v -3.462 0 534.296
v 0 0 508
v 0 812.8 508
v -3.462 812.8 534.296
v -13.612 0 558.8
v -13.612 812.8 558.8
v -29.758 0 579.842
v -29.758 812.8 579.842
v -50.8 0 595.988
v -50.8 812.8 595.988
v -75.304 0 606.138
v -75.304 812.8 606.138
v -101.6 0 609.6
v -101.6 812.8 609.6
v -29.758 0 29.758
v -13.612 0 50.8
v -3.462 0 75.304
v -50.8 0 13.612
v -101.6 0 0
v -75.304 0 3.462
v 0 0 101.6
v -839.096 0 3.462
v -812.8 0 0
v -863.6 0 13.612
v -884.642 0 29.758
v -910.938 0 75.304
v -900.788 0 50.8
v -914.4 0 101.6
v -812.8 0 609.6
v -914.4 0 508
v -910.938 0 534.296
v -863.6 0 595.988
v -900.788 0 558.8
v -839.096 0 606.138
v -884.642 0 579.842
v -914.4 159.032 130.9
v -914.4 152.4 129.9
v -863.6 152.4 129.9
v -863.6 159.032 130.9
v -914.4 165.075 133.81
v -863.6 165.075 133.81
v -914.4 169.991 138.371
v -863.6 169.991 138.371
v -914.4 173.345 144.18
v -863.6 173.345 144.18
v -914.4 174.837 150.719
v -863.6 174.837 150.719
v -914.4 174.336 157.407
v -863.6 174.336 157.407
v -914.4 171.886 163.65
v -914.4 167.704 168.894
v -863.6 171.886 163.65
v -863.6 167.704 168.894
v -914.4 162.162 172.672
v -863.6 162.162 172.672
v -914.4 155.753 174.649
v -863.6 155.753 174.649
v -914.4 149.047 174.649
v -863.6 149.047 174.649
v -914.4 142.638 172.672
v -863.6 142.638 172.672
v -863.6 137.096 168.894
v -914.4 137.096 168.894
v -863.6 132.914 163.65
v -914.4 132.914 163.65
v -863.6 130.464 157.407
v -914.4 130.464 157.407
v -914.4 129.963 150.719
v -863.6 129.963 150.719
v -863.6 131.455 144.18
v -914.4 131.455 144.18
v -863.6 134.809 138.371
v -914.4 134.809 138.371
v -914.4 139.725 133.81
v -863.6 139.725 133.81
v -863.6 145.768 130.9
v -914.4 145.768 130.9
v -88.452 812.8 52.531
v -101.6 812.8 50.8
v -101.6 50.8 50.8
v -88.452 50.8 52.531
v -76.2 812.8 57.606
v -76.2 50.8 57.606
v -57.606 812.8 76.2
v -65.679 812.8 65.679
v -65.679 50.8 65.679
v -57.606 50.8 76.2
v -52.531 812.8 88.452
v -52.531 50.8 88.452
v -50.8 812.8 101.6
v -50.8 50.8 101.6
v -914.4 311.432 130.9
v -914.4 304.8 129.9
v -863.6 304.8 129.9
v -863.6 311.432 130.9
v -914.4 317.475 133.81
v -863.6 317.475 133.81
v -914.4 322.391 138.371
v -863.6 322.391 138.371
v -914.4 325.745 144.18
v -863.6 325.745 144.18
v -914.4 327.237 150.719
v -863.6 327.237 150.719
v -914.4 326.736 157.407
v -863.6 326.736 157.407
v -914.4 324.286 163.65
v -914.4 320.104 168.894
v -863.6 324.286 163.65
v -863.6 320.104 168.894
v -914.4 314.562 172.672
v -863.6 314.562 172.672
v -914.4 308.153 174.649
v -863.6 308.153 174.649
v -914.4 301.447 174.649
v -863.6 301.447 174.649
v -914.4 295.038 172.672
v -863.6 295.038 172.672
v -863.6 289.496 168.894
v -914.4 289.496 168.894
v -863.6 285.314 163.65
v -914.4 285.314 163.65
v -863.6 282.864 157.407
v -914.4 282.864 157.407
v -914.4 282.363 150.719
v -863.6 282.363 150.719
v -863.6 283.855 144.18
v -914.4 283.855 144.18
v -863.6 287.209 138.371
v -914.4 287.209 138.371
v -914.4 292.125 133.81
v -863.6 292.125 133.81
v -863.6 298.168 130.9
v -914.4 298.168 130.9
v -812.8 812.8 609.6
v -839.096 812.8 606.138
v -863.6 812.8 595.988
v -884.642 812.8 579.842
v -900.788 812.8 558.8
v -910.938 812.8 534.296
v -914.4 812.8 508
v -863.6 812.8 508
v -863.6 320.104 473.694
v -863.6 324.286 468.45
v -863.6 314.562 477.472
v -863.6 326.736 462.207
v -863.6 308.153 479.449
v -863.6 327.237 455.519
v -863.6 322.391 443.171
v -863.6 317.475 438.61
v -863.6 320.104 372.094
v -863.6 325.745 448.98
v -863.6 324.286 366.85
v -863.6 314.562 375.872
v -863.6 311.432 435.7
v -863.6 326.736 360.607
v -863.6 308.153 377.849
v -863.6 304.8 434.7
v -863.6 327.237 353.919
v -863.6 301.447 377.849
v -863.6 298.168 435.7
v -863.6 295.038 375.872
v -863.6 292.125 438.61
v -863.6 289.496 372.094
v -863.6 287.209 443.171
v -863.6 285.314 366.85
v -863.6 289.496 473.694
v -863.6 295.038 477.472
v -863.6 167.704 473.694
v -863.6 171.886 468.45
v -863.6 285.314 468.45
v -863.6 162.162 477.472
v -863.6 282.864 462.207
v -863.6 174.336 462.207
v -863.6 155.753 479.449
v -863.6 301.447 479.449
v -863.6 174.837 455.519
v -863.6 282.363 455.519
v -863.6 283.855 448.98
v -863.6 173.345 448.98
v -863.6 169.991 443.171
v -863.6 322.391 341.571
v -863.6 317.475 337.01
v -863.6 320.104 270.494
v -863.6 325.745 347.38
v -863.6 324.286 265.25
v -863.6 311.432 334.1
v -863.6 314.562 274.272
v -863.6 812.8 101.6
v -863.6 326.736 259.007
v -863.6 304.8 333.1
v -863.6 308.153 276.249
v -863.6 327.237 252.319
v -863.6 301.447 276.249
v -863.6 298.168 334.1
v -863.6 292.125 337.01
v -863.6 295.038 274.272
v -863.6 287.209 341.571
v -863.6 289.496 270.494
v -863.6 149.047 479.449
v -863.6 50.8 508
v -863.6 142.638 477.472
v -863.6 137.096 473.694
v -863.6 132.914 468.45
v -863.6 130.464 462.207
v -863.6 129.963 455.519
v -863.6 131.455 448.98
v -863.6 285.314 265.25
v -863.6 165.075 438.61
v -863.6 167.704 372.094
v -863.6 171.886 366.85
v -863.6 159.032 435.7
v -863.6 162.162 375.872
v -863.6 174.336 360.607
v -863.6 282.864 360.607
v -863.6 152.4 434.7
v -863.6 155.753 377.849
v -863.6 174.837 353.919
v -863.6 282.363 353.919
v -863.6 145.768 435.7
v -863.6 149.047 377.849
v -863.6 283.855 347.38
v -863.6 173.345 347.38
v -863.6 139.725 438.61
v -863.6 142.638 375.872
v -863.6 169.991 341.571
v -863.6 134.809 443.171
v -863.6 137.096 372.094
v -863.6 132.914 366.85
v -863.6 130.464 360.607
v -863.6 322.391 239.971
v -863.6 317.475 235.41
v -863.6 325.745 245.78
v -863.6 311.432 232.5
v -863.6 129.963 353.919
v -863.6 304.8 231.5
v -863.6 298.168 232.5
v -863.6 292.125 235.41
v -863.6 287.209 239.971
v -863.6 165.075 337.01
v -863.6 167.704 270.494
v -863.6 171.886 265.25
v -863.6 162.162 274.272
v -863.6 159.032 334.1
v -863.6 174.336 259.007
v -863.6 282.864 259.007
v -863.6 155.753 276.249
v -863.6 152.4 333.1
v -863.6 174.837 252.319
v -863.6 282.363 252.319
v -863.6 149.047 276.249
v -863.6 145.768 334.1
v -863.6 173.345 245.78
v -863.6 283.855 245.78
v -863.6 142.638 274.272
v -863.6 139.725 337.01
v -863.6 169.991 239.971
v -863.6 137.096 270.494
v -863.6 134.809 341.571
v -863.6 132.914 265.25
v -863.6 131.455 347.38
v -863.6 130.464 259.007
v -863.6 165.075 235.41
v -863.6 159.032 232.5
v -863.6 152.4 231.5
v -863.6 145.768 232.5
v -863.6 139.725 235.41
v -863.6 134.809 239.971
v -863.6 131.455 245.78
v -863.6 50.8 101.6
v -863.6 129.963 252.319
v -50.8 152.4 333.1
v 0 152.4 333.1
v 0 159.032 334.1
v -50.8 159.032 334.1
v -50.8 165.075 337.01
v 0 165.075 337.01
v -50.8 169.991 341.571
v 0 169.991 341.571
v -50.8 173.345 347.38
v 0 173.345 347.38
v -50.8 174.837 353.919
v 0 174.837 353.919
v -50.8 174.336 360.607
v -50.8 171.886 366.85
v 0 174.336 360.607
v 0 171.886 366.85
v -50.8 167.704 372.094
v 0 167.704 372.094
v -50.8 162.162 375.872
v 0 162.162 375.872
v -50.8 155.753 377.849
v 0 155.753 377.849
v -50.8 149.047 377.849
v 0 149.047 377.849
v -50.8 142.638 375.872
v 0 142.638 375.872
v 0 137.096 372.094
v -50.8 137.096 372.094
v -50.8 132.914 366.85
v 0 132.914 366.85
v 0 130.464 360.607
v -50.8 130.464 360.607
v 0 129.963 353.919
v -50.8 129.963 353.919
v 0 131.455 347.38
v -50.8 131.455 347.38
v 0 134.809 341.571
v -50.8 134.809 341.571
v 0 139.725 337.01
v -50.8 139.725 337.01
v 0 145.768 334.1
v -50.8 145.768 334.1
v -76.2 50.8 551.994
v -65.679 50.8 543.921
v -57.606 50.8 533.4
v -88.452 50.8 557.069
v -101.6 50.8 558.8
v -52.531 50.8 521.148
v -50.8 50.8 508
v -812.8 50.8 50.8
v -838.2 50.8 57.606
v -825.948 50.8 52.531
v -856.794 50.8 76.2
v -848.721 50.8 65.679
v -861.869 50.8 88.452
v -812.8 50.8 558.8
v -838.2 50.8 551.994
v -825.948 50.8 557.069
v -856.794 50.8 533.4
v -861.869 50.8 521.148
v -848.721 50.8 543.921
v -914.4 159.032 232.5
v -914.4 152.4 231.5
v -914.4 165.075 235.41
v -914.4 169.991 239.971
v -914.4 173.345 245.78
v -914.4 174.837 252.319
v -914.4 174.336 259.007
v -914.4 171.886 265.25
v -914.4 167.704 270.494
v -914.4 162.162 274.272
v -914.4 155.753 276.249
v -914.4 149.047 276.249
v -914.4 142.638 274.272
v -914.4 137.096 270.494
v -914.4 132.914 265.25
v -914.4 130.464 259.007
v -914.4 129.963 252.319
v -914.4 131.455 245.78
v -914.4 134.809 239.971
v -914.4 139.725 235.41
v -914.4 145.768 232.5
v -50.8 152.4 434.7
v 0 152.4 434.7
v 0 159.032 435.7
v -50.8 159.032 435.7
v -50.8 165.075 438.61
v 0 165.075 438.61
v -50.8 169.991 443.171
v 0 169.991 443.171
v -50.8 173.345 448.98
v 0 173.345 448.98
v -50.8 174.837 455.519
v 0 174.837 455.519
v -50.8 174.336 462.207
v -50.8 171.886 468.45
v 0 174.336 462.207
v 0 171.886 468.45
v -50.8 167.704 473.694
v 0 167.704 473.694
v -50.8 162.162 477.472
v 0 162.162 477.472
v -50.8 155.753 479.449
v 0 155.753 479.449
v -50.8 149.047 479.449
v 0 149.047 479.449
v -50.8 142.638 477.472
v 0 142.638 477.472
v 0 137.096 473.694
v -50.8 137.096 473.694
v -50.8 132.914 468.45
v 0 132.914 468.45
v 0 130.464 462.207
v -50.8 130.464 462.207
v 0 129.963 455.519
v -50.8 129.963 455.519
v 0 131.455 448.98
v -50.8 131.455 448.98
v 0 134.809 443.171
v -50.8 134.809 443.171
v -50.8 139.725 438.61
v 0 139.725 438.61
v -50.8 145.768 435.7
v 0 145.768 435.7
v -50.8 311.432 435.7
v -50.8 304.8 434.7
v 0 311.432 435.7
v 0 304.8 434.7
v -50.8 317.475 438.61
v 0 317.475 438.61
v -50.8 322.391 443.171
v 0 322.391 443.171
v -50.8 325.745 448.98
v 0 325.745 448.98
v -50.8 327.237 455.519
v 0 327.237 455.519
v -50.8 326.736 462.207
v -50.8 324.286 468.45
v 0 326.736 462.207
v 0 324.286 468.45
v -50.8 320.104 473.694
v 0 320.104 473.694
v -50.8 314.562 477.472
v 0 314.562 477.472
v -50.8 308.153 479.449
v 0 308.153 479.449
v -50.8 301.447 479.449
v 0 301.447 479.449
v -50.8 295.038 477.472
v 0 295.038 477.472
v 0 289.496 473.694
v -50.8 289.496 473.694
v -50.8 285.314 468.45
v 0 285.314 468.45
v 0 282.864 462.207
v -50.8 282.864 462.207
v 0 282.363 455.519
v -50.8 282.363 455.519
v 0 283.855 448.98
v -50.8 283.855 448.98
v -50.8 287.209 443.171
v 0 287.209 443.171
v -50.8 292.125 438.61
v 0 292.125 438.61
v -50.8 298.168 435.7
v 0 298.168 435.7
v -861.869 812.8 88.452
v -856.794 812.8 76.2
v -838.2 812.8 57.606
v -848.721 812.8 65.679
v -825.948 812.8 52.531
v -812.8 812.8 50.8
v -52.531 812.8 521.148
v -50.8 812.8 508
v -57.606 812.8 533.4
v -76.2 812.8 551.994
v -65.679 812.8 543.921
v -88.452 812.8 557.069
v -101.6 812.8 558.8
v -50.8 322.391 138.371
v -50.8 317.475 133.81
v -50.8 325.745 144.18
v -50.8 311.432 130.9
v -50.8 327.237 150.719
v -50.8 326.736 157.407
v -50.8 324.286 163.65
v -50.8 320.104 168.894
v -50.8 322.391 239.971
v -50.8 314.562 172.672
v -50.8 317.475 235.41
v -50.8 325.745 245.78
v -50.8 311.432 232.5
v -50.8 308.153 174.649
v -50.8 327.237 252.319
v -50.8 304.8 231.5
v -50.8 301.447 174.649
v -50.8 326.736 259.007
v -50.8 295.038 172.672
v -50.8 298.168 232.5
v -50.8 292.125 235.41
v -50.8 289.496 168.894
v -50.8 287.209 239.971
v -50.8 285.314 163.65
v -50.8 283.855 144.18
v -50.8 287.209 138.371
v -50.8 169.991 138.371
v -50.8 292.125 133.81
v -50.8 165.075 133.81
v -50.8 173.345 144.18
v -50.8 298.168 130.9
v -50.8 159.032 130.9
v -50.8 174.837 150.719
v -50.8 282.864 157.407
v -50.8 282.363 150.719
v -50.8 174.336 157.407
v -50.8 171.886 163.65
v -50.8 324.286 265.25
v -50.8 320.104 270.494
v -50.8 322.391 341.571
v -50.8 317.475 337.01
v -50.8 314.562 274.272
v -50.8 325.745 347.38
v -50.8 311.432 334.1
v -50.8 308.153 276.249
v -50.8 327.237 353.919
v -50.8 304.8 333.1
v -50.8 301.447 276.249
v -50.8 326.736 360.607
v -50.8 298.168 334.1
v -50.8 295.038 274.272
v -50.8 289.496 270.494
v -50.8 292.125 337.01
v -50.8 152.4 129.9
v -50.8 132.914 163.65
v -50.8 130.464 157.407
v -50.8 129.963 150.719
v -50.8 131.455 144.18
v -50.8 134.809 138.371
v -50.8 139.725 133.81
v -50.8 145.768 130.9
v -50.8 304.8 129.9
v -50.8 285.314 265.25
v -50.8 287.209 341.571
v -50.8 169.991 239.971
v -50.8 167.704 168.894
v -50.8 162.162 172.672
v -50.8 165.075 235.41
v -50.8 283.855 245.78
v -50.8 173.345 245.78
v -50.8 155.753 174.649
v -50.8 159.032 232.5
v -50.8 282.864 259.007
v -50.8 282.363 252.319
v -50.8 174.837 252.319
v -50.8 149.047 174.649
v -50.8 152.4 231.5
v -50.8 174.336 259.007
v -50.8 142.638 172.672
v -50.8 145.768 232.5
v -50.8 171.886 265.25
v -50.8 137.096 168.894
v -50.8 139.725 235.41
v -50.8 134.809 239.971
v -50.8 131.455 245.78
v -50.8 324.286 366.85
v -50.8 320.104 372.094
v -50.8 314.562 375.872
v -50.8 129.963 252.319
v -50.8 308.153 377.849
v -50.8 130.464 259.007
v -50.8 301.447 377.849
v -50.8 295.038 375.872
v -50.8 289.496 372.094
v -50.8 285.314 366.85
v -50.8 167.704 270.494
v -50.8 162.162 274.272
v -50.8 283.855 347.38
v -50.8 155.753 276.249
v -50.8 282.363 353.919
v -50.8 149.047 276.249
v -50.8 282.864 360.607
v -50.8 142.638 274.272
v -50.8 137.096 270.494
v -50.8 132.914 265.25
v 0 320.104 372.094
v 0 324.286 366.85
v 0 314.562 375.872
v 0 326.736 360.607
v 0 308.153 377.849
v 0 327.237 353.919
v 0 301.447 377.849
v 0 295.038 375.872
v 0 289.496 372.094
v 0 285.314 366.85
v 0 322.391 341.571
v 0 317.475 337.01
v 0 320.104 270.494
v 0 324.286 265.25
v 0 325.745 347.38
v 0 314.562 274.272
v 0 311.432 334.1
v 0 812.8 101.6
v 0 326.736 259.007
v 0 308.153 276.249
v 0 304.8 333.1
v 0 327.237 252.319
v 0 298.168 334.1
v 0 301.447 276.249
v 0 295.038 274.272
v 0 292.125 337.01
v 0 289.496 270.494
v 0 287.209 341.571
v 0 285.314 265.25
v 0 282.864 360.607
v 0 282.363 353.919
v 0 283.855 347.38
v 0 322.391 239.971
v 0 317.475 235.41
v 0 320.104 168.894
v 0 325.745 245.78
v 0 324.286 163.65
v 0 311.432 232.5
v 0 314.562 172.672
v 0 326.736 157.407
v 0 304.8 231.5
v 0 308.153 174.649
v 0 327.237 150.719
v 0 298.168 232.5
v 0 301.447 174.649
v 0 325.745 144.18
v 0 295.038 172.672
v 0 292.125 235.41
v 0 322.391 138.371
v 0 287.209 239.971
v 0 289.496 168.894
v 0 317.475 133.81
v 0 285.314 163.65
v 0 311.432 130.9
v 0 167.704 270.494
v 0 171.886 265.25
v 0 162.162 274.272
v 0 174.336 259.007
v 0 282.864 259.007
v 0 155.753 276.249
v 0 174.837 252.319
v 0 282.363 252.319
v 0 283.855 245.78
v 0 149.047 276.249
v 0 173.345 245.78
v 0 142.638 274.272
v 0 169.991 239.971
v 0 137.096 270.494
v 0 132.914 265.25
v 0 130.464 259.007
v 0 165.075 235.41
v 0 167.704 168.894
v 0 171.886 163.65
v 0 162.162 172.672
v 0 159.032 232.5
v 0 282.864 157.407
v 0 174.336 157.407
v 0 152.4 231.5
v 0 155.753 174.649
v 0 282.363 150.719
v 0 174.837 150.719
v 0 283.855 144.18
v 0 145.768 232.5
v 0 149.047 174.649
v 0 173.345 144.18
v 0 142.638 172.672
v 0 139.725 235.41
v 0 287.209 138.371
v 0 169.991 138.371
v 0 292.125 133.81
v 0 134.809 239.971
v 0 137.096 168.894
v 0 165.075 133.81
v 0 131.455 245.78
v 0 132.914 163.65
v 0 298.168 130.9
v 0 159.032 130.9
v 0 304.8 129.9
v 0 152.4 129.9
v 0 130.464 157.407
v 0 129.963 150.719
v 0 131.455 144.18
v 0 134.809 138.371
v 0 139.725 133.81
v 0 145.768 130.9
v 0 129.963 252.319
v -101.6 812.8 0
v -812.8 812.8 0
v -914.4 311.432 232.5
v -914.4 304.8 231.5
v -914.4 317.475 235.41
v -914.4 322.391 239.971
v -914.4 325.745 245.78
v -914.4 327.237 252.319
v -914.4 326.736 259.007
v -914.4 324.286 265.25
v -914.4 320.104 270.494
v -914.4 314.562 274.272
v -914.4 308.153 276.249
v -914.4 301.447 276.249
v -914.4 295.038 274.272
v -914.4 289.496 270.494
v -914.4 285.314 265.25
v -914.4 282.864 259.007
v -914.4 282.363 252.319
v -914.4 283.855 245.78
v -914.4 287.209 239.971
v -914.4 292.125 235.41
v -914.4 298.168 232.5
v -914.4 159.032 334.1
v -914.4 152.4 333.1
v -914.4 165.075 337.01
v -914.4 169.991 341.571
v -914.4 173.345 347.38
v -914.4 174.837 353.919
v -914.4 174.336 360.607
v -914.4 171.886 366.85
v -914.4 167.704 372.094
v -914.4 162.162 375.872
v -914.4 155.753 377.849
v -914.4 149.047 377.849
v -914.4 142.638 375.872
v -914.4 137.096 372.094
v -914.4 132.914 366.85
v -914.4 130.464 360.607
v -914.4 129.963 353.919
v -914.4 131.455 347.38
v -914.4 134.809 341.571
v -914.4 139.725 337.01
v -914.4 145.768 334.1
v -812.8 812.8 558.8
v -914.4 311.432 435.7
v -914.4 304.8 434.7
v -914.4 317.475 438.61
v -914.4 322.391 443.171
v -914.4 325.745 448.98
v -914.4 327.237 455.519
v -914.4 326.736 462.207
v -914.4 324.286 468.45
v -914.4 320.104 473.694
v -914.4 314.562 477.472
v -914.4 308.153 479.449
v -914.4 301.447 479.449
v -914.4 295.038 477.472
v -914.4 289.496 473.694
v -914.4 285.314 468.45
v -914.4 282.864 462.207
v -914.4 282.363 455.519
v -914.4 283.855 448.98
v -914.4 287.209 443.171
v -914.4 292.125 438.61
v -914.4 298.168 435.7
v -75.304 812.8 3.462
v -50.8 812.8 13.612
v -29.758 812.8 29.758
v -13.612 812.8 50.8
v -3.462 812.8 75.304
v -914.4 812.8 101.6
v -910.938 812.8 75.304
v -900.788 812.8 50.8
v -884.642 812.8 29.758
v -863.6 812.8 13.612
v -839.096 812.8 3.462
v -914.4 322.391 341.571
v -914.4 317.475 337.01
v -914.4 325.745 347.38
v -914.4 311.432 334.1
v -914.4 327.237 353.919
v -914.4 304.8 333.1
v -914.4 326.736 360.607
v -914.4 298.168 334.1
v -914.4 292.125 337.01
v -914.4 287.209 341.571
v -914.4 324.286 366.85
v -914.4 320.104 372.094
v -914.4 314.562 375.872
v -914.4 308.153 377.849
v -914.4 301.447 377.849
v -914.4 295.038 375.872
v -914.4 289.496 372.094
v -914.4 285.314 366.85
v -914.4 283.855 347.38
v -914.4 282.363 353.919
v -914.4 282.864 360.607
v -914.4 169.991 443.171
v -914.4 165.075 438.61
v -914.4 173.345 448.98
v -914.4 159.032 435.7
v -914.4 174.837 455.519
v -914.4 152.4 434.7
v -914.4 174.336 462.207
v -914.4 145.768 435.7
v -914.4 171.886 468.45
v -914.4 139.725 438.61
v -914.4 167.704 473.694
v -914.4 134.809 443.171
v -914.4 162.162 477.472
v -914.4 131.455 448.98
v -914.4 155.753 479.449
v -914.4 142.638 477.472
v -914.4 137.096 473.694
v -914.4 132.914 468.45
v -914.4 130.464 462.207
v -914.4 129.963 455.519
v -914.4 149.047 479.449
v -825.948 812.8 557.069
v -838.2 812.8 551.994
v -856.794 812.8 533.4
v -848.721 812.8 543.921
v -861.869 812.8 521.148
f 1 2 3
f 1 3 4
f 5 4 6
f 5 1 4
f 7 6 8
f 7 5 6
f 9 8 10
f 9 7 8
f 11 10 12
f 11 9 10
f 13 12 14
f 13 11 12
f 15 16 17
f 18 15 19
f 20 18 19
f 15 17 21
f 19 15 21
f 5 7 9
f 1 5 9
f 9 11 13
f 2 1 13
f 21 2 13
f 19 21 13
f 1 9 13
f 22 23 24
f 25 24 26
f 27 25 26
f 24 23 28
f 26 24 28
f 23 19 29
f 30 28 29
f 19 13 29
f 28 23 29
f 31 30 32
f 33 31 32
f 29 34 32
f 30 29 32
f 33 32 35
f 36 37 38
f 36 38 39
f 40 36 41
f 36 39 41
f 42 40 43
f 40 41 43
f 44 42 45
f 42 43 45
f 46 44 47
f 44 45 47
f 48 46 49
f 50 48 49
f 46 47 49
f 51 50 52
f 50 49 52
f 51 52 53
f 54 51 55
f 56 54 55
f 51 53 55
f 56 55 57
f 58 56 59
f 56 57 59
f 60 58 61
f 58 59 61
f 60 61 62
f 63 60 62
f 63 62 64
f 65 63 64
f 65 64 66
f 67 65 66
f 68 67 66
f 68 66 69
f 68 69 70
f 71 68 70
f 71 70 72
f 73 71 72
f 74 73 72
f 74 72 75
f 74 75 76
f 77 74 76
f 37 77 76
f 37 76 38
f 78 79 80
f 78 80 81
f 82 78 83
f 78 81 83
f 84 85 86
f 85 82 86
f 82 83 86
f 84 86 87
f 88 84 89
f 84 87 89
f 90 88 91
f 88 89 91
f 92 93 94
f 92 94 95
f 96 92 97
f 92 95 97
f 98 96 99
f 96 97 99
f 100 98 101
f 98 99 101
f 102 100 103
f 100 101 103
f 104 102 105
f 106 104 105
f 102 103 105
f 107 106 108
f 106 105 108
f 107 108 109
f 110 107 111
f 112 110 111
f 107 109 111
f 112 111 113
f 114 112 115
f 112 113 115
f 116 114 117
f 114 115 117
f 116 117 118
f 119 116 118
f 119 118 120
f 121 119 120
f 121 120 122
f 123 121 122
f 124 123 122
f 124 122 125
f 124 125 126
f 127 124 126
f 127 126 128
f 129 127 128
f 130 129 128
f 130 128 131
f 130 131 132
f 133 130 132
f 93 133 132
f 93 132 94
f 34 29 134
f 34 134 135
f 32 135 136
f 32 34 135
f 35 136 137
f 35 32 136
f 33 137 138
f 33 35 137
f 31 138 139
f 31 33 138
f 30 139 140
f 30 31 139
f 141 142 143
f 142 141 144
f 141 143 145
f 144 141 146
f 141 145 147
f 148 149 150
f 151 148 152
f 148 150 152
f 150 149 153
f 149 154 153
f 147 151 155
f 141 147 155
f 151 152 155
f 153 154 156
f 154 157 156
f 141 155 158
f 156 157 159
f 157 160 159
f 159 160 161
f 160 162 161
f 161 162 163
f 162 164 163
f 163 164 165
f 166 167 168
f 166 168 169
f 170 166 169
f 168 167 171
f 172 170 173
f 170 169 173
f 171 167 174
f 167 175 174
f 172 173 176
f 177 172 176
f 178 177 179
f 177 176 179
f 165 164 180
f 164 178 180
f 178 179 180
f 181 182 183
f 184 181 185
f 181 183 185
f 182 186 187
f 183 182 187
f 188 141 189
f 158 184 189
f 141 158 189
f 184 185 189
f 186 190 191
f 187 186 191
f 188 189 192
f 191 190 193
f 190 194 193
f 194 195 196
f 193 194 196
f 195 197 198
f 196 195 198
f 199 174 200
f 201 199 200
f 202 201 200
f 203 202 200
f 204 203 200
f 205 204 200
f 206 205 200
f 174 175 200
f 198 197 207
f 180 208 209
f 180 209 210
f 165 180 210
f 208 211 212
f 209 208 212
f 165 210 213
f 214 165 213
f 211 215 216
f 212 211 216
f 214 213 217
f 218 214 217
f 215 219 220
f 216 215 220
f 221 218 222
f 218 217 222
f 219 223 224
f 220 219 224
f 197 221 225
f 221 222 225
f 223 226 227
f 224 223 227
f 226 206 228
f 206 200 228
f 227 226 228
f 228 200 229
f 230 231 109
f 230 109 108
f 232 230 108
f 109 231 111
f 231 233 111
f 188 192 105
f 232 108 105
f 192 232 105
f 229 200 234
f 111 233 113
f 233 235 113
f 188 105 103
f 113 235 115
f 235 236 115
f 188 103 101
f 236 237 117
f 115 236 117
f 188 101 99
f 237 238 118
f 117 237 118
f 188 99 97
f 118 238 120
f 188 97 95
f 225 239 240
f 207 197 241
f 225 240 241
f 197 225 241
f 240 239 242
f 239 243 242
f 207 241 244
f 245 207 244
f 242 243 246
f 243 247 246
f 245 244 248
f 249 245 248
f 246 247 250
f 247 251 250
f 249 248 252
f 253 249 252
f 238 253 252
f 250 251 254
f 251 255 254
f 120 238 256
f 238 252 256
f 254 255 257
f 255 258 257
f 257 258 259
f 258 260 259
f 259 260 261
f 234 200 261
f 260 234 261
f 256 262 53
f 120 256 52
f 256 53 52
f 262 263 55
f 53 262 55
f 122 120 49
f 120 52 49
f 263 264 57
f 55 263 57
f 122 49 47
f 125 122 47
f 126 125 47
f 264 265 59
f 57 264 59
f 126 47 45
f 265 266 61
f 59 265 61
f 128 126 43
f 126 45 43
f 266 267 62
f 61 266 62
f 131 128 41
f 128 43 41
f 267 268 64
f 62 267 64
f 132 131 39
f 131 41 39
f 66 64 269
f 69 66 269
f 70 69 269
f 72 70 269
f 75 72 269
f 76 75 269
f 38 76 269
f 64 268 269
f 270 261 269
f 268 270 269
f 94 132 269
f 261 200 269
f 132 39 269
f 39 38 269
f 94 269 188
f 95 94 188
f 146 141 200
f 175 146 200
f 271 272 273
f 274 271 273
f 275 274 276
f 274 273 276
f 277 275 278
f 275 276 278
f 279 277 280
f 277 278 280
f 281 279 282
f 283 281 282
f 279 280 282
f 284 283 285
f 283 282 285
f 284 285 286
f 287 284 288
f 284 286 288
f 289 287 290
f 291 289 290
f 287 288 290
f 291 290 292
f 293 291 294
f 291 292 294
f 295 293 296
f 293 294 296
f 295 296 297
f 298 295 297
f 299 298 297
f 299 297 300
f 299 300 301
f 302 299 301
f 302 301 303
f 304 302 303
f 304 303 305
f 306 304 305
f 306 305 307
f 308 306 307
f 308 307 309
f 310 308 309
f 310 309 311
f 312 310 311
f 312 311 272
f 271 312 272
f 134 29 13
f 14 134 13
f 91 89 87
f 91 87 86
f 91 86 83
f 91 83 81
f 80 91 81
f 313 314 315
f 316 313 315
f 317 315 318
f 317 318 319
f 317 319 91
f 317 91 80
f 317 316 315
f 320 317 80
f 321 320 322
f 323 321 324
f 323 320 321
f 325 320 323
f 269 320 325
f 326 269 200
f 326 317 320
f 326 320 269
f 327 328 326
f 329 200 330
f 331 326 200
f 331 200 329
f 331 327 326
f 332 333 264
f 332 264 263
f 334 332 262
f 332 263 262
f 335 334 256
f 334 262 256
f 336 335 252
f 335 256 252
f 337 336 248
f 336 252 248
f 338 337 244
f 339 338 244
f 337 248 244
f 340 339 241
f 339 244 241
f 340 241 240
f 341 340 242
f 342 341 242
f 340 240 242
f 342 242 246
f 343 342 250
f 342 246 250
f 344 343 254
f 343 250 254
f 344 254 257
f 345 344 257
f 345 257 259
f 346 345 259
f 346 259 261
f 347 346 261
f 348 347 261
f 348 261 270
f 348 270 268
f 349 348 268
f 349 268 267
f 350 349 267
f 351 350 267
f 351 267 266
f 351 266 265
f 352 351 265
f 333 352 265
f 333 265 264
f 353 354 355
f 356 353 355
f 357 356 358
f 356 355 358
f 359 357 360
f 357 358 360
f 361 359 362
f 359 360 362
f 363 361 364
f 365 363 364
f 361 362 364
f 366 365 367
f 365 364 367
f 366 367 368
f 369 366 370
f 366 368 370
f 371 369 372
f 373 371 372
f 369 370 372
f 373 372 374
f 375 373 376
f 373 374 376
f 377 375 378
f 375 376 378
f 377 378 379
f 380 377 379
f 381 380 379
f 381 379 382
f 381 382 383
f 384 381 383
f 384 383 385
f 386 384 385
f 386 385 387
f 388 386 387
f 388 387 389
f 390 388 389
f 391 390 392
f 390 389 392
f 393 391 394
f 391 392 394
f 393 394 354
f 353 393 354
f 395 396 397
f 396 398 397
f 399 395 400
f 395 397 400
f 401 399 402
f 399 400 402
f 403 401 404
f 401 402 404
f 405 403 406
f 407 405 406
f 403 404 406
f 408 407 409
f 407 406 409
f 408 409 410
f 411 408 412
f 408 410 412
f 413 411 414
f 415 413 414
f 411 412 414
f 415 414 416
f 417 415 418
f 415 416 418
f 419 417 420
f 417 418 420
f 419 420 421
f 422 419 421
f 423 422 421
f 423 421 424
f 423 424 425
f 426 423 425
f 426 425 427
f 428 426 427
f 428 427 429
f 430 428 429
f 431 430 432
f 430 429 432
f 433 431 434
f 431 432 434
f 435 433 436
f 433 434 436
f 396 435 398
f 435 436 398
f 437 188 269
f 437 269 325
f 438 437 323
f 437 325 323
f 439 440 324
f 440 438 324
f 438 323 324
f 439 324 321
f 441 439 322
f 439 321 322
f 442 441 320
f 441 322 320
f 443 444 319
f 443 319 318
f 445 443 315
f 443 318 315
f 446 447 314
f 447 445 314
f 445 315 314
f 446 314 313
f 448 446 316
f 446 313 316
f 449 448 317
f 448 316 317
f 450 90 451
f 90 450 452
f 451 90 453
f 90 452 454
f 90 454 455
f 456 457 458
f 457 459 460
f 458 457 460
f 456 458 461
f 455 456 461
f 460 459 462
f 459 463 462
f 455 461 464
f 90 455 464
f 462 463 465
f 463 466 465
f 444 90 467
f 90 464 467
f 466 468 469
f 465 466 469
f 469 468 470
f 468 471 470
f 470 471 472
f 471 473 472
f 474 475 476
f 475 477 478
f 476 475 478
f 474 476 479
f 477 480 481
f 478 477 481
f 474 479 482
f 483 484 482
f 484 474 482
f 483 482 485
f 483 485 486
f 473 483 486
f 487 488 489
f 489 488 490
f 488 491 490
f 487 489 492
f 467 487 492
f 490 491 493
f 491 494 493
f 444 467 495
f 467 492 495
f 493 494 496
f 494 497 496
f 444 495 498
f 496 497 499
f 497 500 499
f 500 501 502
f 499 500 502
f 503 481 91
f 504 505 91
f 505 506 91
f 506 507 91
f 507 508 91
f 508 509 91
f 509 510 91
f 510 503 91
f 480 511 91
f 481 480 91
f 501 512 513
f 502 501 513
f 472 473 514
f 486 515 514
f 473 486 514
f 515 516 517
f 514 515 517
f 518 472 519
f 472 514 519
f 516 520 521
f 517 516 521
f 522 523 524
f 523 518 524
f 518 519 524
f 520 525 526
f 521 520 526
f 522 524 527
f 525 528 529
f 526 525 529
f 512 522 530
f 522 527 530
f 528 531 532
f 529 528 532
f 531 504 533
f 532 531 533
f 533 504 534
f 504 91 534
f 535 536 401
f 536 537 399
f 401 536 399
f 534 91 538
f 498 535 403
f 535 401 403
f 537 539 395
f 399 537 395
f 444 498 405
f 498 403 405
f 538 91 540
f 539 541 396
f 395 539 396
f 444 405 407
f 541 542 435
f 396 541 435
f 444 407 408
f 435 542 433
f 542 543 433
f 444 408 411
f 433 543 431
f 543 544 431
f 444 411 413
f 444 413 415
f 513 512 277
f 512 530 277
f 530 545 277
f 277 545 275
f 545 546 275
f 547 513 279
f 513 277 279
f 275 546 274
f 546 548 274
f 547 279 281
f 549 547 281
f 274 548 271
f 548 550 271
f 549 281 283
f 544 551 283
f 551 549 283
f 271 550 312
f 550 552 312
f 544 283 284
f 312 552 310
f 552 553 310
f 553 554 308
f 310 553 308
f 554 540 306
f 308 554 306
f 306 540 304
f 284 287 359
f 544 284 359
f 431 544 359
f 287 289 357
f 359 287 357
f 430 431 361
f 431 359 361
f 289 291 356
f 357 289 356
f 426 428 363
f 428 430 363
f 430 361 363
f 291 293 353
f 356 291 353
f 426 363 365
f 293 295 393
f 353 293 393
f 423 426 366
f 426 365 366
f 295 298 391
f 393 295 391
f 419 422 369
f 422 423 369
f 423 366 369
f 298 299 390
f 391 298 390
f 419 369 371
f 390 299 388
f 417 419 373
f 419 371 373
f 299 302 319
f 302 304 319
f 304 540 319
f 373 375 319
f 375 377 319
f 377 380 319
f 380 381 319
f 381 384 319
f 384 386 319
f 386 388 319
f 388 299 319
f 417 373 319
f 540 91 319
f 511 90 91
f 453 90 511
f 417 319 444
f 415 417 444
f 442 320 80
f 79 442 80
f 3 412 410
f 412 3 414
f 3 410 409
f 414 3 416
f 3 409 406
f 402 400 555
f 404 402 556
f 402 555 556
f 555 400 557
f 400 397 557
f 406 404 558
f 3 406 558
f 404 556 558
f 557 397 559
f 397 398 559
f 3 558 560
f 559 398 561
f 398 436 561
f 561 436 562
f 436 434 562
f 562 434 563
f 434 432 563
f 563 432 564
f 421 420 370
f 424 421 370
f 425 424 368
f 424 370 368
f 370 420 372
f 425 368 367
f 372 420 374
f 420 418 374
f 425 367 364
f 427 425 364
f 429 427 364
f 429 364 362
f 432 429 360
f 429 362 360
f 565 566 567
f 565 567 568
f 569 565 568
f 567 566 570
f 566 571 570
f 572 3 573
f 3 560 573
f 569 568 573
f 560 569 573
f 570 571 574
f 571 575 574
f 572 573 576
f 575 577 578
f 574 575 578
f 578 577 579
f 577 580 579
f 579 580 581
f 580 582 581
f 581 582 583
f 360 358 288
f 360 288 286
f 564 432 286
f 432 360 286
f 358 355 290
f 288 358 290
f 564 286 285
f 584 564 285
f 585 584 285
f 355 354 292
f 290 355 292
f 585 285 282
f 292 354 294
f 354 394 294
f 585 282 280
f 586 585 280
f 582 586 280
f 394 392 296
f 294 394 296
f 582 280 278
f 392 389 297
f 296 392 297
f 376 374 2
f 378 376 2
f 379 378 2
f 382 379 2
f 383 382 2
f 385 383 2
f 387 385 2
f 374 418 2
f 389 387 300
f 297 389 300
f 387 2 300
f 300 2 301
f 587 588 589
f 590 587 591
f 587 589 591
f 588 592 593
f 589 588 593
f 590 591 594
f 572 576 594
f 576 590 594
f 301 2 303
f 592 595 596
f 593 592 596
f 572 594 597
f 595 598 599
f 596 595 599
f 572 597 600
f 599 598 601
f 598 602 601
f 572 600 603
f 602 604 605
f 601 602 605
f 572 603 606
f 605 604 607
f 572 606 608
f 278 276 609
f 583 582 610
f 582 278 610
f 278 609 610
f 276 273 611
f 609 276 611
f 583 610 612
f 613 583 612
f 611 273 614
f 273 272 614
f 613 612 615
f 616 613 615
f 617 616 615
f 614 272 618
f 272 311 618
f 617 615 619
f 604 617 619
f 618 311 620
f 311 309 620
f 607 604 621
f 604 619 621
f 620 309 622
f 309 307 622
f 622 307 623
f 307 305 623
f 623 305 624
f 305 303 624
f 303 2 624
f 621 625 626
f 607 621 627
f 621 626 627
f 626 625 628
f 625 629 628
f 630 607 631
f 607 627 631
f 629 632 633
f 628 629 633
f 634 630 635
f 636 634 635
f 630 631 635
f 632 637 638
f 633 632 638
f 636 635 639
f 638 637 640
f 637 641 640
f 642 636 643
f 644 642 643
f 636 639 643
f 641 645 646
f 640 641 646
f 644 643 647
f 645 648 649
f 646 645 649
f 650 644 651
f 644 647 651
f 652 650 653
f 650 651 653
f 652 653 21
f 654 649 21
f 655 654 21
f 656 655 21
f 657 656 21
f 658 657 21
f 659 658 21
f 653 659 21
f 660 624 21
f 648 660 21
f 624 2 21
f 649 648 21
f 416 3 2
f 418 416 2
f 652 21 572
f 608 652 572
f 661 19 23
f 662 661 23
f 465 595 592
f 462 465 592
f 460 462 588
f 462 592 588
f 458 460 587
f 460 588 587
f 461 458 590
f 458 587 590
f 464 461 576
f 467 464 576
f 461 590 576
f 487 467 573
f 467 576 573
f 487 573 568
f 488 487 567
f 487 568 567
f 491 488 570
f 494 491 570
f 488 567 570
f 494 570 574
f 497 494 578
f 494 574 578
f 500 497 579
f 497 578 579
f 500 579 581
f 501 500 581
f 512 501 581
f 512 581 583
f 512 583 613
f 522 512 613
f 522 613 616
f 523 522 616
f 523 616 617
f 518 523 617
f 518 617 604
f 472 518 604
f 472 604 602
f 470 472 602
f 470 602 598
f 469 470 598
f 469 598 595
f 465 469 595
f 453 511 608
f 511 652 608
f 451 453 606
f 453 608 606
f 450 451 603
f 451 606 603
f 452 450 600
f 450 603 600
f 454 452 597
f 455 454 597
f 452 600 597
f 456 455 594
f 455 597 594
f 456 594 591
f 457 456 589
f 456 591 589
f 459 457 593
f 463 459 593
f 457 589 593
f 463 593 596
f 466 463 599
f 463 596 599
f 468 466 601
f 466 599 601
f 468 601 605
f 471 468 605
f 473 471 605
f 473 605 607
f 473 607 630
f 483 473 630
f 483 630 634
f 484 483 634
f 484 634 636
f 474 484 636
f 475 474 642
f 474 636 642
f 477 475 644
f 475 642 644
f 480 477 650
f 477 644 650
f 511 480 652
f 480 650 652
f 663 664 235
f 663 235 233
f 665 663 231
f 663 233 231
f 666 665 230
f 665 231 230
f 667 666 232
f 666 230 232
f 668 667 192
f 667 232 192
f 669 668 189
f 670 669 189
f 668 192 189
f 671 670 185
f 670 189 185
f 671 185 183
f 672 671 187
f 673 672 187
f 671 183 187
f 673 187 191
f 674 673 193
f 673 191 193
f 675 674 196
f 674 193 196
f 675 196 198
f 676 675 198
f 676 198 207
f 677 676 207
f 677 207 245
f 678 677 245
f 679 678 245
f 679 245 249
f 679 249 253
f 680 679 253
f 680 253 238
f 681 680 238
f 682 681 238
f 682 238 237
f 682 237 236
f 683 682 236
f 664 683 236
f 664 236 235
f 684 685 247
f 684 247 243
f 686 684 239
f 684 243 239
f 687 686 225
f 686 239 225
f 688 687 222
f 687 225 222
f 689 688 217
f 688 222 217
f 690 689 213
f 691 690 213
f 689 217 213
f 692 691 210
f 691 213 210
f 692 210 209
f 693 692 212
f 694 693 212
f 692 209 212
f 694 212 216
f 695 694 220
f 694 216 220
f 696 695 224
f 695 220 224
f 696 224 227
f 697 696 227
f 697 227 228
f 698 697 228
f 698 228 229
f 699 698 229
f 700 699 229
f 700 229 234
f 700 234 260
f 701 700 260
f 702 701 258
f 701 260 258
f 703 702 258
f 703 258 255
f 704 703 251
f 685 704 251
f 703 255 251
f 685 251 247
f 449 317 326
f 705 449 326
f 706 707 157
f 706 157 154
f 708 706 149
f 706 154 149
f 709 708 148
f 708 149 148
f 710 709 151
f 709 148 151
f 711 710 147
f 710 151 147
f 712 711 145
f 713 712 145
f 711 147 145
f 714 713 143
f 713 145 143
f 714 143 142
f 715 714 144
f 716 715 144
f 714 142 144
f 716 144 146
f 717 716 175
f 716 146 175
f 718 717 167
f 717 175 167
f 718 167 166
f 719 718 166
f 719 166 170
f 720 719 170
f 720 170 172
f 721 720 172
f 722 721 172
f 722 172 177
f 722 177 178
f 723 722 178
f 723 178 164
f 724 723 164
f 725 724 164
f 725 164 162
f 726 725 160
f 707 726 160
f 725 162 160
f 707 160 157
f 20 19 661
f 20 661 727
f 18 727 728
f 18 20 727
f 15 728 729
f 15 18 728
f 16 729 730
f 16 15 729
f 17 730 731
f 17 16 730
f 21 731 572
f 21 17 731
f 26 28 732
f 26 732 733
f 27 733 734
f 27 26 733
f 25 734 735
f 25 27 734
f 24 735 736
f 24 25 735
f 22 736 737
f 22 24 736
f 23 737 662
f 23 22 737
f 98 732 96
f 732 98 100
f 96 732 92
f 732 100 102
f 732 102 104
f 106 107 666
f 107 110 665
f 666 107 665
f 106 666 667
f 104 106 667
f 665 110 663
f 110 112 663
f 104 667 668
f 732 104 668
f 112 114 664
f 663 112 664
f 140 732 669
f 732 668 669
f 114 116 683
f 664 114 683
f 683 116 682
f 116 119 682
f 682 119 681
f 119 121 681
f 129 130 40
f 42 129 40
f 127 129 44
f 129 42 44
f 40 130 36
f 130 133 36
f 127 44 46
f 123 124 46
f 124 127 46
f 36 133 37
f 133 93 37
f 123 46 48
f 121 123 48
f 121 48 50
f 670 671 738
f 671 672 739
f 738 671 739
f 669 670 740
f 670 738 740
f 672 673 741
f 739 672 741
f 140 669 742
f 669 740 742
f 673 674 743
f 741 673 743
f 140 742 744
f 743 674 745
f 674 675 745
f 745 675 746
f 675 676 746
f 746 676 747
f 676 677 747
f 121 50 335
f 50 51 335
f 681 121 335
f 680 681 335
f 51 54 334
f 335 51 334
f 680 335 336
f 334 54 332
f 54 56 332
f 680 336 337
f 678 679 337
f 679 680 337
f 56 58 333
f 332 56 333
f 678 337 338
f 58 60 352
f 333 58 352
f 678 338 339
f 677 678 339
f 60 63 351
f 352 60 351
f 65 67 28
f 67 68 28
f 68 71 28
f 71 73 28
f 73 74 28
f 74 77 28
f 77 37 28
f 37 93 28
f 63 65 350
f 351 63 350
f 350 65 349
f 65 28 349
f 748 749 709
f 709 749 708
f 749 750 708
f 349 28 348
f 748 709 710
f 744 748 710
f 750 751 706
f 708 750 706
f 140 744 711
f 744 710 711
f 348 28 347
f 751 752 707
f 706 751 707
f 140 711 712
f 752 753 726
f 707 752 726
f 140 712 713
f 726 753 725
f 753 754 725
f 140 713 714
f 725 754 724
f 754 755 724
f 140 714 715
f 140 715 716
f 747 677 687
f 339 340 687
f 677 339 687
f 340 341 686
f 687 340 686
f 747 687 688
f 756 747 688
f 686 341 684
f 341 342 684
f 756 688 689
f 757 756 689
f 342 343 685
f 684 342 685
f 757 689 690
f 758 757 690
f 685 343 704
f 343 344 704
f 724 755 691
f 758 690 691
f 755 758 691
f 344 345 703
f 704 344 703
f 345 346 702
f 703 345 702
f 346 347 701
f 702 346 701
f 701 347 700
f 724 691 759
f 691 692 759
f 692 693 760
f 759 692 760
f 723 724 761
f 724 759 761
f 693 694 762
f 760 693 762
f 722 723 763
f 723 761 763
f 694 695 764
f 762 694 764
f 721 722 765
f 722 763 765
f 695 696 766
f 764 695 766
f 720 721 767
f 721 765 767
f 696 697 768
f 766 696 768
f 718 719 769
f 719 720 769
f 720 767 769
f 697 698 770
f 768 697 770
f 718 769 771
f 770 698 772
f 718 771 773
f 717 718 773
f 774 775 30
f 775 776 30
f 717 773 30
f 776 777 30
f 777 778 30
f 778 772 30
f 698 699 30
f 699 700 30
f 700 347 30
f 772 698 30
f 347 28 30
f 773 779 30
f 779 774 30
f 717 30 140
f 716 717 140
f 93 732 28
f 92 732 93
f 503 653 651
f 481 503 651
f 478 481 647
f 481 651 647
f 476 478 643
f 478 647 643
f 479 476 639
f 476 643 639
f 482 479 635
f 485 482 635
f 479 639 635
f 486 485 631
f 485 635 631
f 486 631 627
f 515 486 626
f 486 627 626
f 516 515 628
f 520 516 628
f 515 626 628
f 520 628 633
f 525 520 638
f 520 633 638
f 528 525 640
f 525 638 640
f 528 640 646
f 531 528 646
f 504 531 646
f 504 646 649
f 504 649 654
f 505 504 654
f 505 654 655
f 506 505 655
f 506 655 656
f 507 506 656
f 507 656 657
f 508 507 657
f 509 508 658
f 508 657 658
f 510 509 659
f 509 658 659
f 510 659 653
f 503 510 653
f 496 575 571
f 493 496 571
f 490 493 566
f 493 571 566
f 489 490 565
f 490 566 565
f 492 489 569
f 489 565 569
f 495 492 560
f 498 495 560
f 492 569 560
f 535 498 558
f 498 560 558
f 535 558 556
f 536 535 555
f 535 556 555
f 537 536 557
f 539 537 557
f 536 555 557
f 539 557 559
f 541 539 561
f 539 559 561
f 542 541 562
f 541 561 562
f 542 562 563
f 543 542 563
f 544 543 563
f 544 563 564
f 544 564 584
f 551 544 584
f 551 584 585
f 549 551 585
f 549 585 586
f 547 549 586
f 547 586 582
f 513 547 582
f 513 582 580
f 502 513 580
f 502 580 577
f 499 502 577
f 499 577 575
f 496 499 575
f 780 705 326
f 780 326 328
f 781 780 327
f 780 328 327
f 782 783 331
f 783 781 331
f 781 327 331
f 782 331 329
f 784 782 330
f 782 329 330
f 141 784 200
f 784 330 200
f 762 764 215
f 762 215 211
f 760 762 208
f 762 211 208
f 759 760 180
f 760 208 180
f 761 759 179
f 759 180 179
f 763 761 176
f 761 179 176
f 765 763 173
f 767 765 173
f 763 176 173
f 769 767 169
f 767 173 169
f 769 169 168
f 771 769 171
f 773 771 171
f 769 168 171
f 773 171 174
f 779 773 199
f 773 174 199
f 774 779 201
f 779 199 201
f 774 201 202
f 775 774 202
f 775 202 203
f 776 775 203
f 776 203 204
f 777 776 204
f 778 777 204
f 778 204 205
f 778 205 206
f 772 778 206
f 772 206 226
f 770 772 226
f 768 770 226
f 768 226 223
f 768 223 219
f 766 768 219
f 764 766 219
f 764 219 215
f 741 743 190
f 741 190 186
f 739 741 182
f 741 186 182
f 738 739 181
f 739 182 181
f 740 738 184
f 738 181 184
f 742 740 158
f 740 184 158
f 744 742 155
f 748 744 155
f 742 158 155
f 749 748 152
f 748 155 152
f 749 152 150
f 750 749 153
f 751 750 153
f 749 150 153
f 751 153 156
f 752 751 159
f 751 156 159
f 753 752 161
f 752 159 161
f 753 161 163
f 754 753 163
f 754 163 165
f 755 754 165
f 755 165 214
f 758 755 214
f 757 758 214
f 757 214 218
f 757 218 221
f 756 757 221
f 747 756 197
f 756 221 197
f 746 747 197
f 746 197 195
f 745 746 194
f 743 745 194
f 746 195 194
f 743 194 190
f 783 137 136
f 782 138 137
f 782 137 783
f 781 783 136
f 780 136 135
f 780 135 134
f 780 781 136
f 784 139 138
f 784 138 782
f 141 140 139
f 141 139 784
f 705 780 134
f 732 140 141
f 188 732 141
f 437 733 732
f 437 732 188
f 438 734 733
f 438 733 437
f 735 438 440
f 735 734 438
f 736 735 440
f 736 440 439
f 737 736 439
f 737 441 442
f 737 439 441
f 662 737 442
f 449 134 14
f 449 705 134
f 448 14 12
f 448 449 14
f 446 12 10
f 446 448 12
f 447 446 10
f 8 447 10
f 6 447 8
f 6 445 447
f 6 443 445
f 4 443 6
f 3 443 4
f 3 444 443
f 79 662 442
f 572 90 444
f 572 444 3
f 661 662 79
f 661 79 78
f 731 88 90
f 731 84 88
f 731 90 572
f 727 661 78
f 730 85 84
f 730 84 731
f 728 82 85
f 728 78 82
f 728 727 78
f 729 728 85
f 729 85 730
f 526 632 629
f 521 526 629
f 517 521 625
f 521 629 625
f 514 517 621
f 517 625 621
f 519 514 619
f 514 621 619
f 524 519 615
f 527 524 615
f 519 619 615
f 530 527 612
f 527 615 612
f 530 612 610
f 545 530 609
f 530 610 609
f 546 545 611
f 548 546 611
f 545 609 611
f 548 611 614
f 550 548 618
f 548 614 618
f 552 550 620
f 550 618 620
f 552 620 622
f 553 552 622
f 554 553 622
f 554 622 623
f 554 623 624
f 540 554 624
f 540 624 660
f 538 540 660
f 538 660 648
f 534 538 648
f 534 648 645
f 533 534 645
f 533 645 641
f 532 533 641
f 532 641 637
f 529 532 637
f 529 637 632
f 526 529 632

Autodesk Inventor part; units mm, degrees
ref_plane "YZ Plane" through (0, 0, 0) normal (1, 0, 0) x (0, 1, 0)
ref_plane "XZ Plane" through (0, 0, 0) normal (0, 1, 0) x (-1, 0, 0)
ref_plane "XY Plane" through (0, 0, 0) normal (0, 0, 1) x (1, 0, 0)
sketch "Sketch1" plane through (0, 0, 0) normal (0, 1, 0) x (-1, 0, 0)
  line L0 (101.6, 0) -> (812.8, 0)
  line L1 (914.4, 101.6) -> (914.4, 508)
  line L2 (812.8, 609.6) -> (101.6, 609.6)
  line L3 (0, 508) -> (0, 101.6)
  arc A0 (101.6, 609.6) -> (0, 508) centre (101.6, 508) ccw
  arc A1 (0, 101.6) -> (101.6, 0) centre (101.6, 101.6) ccw
  arc A2 (812.8, 0) -> (914.4, 101.6) centre (812.8, 101.6) ccw
  arc A3 (914.4, 508) -> (812.8, 609.6) centre (812.8, 508) ccw
  point P0 (0, 0)
  point P1 (914.4, 609.6)
  point P2 (914.4, 0)
  point P3 (0, 609.6)
  dimension "d0" = 914.4
  dimension "d1" = 609.6
  dimension "d9" = 101.6
extrude "Extrusion1" add sketch "Sketch1" along normal blind 50.8
sketch "Sketch3" plane through (0, 50.8, 0) normal (0, 1, 0) x (1, 0, 0)
  line L0 (0, -508) -> (0, -101.6) projected
  arc A0 (0, -101.6) -> (-101.6, 0) centre (-101.6, -101.6) ccw projected
  line L1 (-101.6, 0) -> (-812.8, 0) projected
  arc A1 (-812.8, 0) -> (-914.4, -101.6) centre (-812.8, -101.6) ccw projected
  line L2 (-914.4, -101.6) -> (-914.4, -508) projected
  arc A2 (-914.4, -508) -> (-812.8, -609.6) centre (-812.8, -508) ccw projected
  line L3 (-812.8, -609.6) -> (-101.6, -609.6) projected
  arc A3 (-101.6, -609.6) -> (0, -508) centre (-101.6, -508) ccw projected
  line L4 (-812.8, -50.8) -> (-101.6, -50.8)
  arc A4 (-50.8, -101.6) -> (-101.6, -50.8) centre (-101.6, -101.6) ccw
  line L5 (-50.8, -101.6) -> (-50.8, -508)
  arc A5 (-101.6, -558.8) -> (-50.8, -508) centre (-101.6, -508) ccw
  line L6 (-101.6, -558.8) -> (-812.8, -558.8)
  arc A6 (-863.6, -508) -> (-812.8, -558.8) centre (-812.8, -508) ccw
  line L7 (-863.6, -508) -> (-863.6, -101.6)
  arc A7 (-812.8, -50.8) -> (-863.6, -101.6) centre (-812.8, -101.6) ccw
  point P0 (0, 0)
  dimension "d10" = 50.8
extrude "Extrusion3" add sketch "Sketch3" along normal blind 762
sketch "Sketch10" plane through (0, 0, 508) normal (1, 0, 0) x (0, 0, -1)
  circle A0 centre (50.8, 152.4) radius 22.5
  circle A1 centre (152.4, 152.4) radius 22.5
  circle A2 centre (254, 152.4) radius 22.5
  circle A3 centre (355.6, 152.4) radius 22.5
  line L0 (0, 0) -> (0, 812.8) projected
  line L1 (0, 0) -> (406.4, 0) projected
  circle A4 centre (50.8, 304.8) radius 22.5
  circle A5 centre (152.4, 304.8) radius 22.5
  circle A6 centre (254, 304.8) radius 22.5
  circle A7 centre (355.6, 304.8) radius 22.5
  dimension "d56" = 45
  dimension "d57" = 45
  dimension "d58" = 45
  dimension "d59" = 45
  dimension "d60" = 50.8
  dimension "d61" = 101.6
  dimension "d62" = 101.6
  dimension "d63" = 101.6
  dimension "d64" = 152.4
  dimension "d67" = 45
  dimension "d68" = 45
  dimension "d69" = 45
  dimension "d70" = 45
  dimension "d71" = 152.4
extrude "Extrusion4" cut sketch "Sketch10" against normal through all
properties part number "pullbox"
